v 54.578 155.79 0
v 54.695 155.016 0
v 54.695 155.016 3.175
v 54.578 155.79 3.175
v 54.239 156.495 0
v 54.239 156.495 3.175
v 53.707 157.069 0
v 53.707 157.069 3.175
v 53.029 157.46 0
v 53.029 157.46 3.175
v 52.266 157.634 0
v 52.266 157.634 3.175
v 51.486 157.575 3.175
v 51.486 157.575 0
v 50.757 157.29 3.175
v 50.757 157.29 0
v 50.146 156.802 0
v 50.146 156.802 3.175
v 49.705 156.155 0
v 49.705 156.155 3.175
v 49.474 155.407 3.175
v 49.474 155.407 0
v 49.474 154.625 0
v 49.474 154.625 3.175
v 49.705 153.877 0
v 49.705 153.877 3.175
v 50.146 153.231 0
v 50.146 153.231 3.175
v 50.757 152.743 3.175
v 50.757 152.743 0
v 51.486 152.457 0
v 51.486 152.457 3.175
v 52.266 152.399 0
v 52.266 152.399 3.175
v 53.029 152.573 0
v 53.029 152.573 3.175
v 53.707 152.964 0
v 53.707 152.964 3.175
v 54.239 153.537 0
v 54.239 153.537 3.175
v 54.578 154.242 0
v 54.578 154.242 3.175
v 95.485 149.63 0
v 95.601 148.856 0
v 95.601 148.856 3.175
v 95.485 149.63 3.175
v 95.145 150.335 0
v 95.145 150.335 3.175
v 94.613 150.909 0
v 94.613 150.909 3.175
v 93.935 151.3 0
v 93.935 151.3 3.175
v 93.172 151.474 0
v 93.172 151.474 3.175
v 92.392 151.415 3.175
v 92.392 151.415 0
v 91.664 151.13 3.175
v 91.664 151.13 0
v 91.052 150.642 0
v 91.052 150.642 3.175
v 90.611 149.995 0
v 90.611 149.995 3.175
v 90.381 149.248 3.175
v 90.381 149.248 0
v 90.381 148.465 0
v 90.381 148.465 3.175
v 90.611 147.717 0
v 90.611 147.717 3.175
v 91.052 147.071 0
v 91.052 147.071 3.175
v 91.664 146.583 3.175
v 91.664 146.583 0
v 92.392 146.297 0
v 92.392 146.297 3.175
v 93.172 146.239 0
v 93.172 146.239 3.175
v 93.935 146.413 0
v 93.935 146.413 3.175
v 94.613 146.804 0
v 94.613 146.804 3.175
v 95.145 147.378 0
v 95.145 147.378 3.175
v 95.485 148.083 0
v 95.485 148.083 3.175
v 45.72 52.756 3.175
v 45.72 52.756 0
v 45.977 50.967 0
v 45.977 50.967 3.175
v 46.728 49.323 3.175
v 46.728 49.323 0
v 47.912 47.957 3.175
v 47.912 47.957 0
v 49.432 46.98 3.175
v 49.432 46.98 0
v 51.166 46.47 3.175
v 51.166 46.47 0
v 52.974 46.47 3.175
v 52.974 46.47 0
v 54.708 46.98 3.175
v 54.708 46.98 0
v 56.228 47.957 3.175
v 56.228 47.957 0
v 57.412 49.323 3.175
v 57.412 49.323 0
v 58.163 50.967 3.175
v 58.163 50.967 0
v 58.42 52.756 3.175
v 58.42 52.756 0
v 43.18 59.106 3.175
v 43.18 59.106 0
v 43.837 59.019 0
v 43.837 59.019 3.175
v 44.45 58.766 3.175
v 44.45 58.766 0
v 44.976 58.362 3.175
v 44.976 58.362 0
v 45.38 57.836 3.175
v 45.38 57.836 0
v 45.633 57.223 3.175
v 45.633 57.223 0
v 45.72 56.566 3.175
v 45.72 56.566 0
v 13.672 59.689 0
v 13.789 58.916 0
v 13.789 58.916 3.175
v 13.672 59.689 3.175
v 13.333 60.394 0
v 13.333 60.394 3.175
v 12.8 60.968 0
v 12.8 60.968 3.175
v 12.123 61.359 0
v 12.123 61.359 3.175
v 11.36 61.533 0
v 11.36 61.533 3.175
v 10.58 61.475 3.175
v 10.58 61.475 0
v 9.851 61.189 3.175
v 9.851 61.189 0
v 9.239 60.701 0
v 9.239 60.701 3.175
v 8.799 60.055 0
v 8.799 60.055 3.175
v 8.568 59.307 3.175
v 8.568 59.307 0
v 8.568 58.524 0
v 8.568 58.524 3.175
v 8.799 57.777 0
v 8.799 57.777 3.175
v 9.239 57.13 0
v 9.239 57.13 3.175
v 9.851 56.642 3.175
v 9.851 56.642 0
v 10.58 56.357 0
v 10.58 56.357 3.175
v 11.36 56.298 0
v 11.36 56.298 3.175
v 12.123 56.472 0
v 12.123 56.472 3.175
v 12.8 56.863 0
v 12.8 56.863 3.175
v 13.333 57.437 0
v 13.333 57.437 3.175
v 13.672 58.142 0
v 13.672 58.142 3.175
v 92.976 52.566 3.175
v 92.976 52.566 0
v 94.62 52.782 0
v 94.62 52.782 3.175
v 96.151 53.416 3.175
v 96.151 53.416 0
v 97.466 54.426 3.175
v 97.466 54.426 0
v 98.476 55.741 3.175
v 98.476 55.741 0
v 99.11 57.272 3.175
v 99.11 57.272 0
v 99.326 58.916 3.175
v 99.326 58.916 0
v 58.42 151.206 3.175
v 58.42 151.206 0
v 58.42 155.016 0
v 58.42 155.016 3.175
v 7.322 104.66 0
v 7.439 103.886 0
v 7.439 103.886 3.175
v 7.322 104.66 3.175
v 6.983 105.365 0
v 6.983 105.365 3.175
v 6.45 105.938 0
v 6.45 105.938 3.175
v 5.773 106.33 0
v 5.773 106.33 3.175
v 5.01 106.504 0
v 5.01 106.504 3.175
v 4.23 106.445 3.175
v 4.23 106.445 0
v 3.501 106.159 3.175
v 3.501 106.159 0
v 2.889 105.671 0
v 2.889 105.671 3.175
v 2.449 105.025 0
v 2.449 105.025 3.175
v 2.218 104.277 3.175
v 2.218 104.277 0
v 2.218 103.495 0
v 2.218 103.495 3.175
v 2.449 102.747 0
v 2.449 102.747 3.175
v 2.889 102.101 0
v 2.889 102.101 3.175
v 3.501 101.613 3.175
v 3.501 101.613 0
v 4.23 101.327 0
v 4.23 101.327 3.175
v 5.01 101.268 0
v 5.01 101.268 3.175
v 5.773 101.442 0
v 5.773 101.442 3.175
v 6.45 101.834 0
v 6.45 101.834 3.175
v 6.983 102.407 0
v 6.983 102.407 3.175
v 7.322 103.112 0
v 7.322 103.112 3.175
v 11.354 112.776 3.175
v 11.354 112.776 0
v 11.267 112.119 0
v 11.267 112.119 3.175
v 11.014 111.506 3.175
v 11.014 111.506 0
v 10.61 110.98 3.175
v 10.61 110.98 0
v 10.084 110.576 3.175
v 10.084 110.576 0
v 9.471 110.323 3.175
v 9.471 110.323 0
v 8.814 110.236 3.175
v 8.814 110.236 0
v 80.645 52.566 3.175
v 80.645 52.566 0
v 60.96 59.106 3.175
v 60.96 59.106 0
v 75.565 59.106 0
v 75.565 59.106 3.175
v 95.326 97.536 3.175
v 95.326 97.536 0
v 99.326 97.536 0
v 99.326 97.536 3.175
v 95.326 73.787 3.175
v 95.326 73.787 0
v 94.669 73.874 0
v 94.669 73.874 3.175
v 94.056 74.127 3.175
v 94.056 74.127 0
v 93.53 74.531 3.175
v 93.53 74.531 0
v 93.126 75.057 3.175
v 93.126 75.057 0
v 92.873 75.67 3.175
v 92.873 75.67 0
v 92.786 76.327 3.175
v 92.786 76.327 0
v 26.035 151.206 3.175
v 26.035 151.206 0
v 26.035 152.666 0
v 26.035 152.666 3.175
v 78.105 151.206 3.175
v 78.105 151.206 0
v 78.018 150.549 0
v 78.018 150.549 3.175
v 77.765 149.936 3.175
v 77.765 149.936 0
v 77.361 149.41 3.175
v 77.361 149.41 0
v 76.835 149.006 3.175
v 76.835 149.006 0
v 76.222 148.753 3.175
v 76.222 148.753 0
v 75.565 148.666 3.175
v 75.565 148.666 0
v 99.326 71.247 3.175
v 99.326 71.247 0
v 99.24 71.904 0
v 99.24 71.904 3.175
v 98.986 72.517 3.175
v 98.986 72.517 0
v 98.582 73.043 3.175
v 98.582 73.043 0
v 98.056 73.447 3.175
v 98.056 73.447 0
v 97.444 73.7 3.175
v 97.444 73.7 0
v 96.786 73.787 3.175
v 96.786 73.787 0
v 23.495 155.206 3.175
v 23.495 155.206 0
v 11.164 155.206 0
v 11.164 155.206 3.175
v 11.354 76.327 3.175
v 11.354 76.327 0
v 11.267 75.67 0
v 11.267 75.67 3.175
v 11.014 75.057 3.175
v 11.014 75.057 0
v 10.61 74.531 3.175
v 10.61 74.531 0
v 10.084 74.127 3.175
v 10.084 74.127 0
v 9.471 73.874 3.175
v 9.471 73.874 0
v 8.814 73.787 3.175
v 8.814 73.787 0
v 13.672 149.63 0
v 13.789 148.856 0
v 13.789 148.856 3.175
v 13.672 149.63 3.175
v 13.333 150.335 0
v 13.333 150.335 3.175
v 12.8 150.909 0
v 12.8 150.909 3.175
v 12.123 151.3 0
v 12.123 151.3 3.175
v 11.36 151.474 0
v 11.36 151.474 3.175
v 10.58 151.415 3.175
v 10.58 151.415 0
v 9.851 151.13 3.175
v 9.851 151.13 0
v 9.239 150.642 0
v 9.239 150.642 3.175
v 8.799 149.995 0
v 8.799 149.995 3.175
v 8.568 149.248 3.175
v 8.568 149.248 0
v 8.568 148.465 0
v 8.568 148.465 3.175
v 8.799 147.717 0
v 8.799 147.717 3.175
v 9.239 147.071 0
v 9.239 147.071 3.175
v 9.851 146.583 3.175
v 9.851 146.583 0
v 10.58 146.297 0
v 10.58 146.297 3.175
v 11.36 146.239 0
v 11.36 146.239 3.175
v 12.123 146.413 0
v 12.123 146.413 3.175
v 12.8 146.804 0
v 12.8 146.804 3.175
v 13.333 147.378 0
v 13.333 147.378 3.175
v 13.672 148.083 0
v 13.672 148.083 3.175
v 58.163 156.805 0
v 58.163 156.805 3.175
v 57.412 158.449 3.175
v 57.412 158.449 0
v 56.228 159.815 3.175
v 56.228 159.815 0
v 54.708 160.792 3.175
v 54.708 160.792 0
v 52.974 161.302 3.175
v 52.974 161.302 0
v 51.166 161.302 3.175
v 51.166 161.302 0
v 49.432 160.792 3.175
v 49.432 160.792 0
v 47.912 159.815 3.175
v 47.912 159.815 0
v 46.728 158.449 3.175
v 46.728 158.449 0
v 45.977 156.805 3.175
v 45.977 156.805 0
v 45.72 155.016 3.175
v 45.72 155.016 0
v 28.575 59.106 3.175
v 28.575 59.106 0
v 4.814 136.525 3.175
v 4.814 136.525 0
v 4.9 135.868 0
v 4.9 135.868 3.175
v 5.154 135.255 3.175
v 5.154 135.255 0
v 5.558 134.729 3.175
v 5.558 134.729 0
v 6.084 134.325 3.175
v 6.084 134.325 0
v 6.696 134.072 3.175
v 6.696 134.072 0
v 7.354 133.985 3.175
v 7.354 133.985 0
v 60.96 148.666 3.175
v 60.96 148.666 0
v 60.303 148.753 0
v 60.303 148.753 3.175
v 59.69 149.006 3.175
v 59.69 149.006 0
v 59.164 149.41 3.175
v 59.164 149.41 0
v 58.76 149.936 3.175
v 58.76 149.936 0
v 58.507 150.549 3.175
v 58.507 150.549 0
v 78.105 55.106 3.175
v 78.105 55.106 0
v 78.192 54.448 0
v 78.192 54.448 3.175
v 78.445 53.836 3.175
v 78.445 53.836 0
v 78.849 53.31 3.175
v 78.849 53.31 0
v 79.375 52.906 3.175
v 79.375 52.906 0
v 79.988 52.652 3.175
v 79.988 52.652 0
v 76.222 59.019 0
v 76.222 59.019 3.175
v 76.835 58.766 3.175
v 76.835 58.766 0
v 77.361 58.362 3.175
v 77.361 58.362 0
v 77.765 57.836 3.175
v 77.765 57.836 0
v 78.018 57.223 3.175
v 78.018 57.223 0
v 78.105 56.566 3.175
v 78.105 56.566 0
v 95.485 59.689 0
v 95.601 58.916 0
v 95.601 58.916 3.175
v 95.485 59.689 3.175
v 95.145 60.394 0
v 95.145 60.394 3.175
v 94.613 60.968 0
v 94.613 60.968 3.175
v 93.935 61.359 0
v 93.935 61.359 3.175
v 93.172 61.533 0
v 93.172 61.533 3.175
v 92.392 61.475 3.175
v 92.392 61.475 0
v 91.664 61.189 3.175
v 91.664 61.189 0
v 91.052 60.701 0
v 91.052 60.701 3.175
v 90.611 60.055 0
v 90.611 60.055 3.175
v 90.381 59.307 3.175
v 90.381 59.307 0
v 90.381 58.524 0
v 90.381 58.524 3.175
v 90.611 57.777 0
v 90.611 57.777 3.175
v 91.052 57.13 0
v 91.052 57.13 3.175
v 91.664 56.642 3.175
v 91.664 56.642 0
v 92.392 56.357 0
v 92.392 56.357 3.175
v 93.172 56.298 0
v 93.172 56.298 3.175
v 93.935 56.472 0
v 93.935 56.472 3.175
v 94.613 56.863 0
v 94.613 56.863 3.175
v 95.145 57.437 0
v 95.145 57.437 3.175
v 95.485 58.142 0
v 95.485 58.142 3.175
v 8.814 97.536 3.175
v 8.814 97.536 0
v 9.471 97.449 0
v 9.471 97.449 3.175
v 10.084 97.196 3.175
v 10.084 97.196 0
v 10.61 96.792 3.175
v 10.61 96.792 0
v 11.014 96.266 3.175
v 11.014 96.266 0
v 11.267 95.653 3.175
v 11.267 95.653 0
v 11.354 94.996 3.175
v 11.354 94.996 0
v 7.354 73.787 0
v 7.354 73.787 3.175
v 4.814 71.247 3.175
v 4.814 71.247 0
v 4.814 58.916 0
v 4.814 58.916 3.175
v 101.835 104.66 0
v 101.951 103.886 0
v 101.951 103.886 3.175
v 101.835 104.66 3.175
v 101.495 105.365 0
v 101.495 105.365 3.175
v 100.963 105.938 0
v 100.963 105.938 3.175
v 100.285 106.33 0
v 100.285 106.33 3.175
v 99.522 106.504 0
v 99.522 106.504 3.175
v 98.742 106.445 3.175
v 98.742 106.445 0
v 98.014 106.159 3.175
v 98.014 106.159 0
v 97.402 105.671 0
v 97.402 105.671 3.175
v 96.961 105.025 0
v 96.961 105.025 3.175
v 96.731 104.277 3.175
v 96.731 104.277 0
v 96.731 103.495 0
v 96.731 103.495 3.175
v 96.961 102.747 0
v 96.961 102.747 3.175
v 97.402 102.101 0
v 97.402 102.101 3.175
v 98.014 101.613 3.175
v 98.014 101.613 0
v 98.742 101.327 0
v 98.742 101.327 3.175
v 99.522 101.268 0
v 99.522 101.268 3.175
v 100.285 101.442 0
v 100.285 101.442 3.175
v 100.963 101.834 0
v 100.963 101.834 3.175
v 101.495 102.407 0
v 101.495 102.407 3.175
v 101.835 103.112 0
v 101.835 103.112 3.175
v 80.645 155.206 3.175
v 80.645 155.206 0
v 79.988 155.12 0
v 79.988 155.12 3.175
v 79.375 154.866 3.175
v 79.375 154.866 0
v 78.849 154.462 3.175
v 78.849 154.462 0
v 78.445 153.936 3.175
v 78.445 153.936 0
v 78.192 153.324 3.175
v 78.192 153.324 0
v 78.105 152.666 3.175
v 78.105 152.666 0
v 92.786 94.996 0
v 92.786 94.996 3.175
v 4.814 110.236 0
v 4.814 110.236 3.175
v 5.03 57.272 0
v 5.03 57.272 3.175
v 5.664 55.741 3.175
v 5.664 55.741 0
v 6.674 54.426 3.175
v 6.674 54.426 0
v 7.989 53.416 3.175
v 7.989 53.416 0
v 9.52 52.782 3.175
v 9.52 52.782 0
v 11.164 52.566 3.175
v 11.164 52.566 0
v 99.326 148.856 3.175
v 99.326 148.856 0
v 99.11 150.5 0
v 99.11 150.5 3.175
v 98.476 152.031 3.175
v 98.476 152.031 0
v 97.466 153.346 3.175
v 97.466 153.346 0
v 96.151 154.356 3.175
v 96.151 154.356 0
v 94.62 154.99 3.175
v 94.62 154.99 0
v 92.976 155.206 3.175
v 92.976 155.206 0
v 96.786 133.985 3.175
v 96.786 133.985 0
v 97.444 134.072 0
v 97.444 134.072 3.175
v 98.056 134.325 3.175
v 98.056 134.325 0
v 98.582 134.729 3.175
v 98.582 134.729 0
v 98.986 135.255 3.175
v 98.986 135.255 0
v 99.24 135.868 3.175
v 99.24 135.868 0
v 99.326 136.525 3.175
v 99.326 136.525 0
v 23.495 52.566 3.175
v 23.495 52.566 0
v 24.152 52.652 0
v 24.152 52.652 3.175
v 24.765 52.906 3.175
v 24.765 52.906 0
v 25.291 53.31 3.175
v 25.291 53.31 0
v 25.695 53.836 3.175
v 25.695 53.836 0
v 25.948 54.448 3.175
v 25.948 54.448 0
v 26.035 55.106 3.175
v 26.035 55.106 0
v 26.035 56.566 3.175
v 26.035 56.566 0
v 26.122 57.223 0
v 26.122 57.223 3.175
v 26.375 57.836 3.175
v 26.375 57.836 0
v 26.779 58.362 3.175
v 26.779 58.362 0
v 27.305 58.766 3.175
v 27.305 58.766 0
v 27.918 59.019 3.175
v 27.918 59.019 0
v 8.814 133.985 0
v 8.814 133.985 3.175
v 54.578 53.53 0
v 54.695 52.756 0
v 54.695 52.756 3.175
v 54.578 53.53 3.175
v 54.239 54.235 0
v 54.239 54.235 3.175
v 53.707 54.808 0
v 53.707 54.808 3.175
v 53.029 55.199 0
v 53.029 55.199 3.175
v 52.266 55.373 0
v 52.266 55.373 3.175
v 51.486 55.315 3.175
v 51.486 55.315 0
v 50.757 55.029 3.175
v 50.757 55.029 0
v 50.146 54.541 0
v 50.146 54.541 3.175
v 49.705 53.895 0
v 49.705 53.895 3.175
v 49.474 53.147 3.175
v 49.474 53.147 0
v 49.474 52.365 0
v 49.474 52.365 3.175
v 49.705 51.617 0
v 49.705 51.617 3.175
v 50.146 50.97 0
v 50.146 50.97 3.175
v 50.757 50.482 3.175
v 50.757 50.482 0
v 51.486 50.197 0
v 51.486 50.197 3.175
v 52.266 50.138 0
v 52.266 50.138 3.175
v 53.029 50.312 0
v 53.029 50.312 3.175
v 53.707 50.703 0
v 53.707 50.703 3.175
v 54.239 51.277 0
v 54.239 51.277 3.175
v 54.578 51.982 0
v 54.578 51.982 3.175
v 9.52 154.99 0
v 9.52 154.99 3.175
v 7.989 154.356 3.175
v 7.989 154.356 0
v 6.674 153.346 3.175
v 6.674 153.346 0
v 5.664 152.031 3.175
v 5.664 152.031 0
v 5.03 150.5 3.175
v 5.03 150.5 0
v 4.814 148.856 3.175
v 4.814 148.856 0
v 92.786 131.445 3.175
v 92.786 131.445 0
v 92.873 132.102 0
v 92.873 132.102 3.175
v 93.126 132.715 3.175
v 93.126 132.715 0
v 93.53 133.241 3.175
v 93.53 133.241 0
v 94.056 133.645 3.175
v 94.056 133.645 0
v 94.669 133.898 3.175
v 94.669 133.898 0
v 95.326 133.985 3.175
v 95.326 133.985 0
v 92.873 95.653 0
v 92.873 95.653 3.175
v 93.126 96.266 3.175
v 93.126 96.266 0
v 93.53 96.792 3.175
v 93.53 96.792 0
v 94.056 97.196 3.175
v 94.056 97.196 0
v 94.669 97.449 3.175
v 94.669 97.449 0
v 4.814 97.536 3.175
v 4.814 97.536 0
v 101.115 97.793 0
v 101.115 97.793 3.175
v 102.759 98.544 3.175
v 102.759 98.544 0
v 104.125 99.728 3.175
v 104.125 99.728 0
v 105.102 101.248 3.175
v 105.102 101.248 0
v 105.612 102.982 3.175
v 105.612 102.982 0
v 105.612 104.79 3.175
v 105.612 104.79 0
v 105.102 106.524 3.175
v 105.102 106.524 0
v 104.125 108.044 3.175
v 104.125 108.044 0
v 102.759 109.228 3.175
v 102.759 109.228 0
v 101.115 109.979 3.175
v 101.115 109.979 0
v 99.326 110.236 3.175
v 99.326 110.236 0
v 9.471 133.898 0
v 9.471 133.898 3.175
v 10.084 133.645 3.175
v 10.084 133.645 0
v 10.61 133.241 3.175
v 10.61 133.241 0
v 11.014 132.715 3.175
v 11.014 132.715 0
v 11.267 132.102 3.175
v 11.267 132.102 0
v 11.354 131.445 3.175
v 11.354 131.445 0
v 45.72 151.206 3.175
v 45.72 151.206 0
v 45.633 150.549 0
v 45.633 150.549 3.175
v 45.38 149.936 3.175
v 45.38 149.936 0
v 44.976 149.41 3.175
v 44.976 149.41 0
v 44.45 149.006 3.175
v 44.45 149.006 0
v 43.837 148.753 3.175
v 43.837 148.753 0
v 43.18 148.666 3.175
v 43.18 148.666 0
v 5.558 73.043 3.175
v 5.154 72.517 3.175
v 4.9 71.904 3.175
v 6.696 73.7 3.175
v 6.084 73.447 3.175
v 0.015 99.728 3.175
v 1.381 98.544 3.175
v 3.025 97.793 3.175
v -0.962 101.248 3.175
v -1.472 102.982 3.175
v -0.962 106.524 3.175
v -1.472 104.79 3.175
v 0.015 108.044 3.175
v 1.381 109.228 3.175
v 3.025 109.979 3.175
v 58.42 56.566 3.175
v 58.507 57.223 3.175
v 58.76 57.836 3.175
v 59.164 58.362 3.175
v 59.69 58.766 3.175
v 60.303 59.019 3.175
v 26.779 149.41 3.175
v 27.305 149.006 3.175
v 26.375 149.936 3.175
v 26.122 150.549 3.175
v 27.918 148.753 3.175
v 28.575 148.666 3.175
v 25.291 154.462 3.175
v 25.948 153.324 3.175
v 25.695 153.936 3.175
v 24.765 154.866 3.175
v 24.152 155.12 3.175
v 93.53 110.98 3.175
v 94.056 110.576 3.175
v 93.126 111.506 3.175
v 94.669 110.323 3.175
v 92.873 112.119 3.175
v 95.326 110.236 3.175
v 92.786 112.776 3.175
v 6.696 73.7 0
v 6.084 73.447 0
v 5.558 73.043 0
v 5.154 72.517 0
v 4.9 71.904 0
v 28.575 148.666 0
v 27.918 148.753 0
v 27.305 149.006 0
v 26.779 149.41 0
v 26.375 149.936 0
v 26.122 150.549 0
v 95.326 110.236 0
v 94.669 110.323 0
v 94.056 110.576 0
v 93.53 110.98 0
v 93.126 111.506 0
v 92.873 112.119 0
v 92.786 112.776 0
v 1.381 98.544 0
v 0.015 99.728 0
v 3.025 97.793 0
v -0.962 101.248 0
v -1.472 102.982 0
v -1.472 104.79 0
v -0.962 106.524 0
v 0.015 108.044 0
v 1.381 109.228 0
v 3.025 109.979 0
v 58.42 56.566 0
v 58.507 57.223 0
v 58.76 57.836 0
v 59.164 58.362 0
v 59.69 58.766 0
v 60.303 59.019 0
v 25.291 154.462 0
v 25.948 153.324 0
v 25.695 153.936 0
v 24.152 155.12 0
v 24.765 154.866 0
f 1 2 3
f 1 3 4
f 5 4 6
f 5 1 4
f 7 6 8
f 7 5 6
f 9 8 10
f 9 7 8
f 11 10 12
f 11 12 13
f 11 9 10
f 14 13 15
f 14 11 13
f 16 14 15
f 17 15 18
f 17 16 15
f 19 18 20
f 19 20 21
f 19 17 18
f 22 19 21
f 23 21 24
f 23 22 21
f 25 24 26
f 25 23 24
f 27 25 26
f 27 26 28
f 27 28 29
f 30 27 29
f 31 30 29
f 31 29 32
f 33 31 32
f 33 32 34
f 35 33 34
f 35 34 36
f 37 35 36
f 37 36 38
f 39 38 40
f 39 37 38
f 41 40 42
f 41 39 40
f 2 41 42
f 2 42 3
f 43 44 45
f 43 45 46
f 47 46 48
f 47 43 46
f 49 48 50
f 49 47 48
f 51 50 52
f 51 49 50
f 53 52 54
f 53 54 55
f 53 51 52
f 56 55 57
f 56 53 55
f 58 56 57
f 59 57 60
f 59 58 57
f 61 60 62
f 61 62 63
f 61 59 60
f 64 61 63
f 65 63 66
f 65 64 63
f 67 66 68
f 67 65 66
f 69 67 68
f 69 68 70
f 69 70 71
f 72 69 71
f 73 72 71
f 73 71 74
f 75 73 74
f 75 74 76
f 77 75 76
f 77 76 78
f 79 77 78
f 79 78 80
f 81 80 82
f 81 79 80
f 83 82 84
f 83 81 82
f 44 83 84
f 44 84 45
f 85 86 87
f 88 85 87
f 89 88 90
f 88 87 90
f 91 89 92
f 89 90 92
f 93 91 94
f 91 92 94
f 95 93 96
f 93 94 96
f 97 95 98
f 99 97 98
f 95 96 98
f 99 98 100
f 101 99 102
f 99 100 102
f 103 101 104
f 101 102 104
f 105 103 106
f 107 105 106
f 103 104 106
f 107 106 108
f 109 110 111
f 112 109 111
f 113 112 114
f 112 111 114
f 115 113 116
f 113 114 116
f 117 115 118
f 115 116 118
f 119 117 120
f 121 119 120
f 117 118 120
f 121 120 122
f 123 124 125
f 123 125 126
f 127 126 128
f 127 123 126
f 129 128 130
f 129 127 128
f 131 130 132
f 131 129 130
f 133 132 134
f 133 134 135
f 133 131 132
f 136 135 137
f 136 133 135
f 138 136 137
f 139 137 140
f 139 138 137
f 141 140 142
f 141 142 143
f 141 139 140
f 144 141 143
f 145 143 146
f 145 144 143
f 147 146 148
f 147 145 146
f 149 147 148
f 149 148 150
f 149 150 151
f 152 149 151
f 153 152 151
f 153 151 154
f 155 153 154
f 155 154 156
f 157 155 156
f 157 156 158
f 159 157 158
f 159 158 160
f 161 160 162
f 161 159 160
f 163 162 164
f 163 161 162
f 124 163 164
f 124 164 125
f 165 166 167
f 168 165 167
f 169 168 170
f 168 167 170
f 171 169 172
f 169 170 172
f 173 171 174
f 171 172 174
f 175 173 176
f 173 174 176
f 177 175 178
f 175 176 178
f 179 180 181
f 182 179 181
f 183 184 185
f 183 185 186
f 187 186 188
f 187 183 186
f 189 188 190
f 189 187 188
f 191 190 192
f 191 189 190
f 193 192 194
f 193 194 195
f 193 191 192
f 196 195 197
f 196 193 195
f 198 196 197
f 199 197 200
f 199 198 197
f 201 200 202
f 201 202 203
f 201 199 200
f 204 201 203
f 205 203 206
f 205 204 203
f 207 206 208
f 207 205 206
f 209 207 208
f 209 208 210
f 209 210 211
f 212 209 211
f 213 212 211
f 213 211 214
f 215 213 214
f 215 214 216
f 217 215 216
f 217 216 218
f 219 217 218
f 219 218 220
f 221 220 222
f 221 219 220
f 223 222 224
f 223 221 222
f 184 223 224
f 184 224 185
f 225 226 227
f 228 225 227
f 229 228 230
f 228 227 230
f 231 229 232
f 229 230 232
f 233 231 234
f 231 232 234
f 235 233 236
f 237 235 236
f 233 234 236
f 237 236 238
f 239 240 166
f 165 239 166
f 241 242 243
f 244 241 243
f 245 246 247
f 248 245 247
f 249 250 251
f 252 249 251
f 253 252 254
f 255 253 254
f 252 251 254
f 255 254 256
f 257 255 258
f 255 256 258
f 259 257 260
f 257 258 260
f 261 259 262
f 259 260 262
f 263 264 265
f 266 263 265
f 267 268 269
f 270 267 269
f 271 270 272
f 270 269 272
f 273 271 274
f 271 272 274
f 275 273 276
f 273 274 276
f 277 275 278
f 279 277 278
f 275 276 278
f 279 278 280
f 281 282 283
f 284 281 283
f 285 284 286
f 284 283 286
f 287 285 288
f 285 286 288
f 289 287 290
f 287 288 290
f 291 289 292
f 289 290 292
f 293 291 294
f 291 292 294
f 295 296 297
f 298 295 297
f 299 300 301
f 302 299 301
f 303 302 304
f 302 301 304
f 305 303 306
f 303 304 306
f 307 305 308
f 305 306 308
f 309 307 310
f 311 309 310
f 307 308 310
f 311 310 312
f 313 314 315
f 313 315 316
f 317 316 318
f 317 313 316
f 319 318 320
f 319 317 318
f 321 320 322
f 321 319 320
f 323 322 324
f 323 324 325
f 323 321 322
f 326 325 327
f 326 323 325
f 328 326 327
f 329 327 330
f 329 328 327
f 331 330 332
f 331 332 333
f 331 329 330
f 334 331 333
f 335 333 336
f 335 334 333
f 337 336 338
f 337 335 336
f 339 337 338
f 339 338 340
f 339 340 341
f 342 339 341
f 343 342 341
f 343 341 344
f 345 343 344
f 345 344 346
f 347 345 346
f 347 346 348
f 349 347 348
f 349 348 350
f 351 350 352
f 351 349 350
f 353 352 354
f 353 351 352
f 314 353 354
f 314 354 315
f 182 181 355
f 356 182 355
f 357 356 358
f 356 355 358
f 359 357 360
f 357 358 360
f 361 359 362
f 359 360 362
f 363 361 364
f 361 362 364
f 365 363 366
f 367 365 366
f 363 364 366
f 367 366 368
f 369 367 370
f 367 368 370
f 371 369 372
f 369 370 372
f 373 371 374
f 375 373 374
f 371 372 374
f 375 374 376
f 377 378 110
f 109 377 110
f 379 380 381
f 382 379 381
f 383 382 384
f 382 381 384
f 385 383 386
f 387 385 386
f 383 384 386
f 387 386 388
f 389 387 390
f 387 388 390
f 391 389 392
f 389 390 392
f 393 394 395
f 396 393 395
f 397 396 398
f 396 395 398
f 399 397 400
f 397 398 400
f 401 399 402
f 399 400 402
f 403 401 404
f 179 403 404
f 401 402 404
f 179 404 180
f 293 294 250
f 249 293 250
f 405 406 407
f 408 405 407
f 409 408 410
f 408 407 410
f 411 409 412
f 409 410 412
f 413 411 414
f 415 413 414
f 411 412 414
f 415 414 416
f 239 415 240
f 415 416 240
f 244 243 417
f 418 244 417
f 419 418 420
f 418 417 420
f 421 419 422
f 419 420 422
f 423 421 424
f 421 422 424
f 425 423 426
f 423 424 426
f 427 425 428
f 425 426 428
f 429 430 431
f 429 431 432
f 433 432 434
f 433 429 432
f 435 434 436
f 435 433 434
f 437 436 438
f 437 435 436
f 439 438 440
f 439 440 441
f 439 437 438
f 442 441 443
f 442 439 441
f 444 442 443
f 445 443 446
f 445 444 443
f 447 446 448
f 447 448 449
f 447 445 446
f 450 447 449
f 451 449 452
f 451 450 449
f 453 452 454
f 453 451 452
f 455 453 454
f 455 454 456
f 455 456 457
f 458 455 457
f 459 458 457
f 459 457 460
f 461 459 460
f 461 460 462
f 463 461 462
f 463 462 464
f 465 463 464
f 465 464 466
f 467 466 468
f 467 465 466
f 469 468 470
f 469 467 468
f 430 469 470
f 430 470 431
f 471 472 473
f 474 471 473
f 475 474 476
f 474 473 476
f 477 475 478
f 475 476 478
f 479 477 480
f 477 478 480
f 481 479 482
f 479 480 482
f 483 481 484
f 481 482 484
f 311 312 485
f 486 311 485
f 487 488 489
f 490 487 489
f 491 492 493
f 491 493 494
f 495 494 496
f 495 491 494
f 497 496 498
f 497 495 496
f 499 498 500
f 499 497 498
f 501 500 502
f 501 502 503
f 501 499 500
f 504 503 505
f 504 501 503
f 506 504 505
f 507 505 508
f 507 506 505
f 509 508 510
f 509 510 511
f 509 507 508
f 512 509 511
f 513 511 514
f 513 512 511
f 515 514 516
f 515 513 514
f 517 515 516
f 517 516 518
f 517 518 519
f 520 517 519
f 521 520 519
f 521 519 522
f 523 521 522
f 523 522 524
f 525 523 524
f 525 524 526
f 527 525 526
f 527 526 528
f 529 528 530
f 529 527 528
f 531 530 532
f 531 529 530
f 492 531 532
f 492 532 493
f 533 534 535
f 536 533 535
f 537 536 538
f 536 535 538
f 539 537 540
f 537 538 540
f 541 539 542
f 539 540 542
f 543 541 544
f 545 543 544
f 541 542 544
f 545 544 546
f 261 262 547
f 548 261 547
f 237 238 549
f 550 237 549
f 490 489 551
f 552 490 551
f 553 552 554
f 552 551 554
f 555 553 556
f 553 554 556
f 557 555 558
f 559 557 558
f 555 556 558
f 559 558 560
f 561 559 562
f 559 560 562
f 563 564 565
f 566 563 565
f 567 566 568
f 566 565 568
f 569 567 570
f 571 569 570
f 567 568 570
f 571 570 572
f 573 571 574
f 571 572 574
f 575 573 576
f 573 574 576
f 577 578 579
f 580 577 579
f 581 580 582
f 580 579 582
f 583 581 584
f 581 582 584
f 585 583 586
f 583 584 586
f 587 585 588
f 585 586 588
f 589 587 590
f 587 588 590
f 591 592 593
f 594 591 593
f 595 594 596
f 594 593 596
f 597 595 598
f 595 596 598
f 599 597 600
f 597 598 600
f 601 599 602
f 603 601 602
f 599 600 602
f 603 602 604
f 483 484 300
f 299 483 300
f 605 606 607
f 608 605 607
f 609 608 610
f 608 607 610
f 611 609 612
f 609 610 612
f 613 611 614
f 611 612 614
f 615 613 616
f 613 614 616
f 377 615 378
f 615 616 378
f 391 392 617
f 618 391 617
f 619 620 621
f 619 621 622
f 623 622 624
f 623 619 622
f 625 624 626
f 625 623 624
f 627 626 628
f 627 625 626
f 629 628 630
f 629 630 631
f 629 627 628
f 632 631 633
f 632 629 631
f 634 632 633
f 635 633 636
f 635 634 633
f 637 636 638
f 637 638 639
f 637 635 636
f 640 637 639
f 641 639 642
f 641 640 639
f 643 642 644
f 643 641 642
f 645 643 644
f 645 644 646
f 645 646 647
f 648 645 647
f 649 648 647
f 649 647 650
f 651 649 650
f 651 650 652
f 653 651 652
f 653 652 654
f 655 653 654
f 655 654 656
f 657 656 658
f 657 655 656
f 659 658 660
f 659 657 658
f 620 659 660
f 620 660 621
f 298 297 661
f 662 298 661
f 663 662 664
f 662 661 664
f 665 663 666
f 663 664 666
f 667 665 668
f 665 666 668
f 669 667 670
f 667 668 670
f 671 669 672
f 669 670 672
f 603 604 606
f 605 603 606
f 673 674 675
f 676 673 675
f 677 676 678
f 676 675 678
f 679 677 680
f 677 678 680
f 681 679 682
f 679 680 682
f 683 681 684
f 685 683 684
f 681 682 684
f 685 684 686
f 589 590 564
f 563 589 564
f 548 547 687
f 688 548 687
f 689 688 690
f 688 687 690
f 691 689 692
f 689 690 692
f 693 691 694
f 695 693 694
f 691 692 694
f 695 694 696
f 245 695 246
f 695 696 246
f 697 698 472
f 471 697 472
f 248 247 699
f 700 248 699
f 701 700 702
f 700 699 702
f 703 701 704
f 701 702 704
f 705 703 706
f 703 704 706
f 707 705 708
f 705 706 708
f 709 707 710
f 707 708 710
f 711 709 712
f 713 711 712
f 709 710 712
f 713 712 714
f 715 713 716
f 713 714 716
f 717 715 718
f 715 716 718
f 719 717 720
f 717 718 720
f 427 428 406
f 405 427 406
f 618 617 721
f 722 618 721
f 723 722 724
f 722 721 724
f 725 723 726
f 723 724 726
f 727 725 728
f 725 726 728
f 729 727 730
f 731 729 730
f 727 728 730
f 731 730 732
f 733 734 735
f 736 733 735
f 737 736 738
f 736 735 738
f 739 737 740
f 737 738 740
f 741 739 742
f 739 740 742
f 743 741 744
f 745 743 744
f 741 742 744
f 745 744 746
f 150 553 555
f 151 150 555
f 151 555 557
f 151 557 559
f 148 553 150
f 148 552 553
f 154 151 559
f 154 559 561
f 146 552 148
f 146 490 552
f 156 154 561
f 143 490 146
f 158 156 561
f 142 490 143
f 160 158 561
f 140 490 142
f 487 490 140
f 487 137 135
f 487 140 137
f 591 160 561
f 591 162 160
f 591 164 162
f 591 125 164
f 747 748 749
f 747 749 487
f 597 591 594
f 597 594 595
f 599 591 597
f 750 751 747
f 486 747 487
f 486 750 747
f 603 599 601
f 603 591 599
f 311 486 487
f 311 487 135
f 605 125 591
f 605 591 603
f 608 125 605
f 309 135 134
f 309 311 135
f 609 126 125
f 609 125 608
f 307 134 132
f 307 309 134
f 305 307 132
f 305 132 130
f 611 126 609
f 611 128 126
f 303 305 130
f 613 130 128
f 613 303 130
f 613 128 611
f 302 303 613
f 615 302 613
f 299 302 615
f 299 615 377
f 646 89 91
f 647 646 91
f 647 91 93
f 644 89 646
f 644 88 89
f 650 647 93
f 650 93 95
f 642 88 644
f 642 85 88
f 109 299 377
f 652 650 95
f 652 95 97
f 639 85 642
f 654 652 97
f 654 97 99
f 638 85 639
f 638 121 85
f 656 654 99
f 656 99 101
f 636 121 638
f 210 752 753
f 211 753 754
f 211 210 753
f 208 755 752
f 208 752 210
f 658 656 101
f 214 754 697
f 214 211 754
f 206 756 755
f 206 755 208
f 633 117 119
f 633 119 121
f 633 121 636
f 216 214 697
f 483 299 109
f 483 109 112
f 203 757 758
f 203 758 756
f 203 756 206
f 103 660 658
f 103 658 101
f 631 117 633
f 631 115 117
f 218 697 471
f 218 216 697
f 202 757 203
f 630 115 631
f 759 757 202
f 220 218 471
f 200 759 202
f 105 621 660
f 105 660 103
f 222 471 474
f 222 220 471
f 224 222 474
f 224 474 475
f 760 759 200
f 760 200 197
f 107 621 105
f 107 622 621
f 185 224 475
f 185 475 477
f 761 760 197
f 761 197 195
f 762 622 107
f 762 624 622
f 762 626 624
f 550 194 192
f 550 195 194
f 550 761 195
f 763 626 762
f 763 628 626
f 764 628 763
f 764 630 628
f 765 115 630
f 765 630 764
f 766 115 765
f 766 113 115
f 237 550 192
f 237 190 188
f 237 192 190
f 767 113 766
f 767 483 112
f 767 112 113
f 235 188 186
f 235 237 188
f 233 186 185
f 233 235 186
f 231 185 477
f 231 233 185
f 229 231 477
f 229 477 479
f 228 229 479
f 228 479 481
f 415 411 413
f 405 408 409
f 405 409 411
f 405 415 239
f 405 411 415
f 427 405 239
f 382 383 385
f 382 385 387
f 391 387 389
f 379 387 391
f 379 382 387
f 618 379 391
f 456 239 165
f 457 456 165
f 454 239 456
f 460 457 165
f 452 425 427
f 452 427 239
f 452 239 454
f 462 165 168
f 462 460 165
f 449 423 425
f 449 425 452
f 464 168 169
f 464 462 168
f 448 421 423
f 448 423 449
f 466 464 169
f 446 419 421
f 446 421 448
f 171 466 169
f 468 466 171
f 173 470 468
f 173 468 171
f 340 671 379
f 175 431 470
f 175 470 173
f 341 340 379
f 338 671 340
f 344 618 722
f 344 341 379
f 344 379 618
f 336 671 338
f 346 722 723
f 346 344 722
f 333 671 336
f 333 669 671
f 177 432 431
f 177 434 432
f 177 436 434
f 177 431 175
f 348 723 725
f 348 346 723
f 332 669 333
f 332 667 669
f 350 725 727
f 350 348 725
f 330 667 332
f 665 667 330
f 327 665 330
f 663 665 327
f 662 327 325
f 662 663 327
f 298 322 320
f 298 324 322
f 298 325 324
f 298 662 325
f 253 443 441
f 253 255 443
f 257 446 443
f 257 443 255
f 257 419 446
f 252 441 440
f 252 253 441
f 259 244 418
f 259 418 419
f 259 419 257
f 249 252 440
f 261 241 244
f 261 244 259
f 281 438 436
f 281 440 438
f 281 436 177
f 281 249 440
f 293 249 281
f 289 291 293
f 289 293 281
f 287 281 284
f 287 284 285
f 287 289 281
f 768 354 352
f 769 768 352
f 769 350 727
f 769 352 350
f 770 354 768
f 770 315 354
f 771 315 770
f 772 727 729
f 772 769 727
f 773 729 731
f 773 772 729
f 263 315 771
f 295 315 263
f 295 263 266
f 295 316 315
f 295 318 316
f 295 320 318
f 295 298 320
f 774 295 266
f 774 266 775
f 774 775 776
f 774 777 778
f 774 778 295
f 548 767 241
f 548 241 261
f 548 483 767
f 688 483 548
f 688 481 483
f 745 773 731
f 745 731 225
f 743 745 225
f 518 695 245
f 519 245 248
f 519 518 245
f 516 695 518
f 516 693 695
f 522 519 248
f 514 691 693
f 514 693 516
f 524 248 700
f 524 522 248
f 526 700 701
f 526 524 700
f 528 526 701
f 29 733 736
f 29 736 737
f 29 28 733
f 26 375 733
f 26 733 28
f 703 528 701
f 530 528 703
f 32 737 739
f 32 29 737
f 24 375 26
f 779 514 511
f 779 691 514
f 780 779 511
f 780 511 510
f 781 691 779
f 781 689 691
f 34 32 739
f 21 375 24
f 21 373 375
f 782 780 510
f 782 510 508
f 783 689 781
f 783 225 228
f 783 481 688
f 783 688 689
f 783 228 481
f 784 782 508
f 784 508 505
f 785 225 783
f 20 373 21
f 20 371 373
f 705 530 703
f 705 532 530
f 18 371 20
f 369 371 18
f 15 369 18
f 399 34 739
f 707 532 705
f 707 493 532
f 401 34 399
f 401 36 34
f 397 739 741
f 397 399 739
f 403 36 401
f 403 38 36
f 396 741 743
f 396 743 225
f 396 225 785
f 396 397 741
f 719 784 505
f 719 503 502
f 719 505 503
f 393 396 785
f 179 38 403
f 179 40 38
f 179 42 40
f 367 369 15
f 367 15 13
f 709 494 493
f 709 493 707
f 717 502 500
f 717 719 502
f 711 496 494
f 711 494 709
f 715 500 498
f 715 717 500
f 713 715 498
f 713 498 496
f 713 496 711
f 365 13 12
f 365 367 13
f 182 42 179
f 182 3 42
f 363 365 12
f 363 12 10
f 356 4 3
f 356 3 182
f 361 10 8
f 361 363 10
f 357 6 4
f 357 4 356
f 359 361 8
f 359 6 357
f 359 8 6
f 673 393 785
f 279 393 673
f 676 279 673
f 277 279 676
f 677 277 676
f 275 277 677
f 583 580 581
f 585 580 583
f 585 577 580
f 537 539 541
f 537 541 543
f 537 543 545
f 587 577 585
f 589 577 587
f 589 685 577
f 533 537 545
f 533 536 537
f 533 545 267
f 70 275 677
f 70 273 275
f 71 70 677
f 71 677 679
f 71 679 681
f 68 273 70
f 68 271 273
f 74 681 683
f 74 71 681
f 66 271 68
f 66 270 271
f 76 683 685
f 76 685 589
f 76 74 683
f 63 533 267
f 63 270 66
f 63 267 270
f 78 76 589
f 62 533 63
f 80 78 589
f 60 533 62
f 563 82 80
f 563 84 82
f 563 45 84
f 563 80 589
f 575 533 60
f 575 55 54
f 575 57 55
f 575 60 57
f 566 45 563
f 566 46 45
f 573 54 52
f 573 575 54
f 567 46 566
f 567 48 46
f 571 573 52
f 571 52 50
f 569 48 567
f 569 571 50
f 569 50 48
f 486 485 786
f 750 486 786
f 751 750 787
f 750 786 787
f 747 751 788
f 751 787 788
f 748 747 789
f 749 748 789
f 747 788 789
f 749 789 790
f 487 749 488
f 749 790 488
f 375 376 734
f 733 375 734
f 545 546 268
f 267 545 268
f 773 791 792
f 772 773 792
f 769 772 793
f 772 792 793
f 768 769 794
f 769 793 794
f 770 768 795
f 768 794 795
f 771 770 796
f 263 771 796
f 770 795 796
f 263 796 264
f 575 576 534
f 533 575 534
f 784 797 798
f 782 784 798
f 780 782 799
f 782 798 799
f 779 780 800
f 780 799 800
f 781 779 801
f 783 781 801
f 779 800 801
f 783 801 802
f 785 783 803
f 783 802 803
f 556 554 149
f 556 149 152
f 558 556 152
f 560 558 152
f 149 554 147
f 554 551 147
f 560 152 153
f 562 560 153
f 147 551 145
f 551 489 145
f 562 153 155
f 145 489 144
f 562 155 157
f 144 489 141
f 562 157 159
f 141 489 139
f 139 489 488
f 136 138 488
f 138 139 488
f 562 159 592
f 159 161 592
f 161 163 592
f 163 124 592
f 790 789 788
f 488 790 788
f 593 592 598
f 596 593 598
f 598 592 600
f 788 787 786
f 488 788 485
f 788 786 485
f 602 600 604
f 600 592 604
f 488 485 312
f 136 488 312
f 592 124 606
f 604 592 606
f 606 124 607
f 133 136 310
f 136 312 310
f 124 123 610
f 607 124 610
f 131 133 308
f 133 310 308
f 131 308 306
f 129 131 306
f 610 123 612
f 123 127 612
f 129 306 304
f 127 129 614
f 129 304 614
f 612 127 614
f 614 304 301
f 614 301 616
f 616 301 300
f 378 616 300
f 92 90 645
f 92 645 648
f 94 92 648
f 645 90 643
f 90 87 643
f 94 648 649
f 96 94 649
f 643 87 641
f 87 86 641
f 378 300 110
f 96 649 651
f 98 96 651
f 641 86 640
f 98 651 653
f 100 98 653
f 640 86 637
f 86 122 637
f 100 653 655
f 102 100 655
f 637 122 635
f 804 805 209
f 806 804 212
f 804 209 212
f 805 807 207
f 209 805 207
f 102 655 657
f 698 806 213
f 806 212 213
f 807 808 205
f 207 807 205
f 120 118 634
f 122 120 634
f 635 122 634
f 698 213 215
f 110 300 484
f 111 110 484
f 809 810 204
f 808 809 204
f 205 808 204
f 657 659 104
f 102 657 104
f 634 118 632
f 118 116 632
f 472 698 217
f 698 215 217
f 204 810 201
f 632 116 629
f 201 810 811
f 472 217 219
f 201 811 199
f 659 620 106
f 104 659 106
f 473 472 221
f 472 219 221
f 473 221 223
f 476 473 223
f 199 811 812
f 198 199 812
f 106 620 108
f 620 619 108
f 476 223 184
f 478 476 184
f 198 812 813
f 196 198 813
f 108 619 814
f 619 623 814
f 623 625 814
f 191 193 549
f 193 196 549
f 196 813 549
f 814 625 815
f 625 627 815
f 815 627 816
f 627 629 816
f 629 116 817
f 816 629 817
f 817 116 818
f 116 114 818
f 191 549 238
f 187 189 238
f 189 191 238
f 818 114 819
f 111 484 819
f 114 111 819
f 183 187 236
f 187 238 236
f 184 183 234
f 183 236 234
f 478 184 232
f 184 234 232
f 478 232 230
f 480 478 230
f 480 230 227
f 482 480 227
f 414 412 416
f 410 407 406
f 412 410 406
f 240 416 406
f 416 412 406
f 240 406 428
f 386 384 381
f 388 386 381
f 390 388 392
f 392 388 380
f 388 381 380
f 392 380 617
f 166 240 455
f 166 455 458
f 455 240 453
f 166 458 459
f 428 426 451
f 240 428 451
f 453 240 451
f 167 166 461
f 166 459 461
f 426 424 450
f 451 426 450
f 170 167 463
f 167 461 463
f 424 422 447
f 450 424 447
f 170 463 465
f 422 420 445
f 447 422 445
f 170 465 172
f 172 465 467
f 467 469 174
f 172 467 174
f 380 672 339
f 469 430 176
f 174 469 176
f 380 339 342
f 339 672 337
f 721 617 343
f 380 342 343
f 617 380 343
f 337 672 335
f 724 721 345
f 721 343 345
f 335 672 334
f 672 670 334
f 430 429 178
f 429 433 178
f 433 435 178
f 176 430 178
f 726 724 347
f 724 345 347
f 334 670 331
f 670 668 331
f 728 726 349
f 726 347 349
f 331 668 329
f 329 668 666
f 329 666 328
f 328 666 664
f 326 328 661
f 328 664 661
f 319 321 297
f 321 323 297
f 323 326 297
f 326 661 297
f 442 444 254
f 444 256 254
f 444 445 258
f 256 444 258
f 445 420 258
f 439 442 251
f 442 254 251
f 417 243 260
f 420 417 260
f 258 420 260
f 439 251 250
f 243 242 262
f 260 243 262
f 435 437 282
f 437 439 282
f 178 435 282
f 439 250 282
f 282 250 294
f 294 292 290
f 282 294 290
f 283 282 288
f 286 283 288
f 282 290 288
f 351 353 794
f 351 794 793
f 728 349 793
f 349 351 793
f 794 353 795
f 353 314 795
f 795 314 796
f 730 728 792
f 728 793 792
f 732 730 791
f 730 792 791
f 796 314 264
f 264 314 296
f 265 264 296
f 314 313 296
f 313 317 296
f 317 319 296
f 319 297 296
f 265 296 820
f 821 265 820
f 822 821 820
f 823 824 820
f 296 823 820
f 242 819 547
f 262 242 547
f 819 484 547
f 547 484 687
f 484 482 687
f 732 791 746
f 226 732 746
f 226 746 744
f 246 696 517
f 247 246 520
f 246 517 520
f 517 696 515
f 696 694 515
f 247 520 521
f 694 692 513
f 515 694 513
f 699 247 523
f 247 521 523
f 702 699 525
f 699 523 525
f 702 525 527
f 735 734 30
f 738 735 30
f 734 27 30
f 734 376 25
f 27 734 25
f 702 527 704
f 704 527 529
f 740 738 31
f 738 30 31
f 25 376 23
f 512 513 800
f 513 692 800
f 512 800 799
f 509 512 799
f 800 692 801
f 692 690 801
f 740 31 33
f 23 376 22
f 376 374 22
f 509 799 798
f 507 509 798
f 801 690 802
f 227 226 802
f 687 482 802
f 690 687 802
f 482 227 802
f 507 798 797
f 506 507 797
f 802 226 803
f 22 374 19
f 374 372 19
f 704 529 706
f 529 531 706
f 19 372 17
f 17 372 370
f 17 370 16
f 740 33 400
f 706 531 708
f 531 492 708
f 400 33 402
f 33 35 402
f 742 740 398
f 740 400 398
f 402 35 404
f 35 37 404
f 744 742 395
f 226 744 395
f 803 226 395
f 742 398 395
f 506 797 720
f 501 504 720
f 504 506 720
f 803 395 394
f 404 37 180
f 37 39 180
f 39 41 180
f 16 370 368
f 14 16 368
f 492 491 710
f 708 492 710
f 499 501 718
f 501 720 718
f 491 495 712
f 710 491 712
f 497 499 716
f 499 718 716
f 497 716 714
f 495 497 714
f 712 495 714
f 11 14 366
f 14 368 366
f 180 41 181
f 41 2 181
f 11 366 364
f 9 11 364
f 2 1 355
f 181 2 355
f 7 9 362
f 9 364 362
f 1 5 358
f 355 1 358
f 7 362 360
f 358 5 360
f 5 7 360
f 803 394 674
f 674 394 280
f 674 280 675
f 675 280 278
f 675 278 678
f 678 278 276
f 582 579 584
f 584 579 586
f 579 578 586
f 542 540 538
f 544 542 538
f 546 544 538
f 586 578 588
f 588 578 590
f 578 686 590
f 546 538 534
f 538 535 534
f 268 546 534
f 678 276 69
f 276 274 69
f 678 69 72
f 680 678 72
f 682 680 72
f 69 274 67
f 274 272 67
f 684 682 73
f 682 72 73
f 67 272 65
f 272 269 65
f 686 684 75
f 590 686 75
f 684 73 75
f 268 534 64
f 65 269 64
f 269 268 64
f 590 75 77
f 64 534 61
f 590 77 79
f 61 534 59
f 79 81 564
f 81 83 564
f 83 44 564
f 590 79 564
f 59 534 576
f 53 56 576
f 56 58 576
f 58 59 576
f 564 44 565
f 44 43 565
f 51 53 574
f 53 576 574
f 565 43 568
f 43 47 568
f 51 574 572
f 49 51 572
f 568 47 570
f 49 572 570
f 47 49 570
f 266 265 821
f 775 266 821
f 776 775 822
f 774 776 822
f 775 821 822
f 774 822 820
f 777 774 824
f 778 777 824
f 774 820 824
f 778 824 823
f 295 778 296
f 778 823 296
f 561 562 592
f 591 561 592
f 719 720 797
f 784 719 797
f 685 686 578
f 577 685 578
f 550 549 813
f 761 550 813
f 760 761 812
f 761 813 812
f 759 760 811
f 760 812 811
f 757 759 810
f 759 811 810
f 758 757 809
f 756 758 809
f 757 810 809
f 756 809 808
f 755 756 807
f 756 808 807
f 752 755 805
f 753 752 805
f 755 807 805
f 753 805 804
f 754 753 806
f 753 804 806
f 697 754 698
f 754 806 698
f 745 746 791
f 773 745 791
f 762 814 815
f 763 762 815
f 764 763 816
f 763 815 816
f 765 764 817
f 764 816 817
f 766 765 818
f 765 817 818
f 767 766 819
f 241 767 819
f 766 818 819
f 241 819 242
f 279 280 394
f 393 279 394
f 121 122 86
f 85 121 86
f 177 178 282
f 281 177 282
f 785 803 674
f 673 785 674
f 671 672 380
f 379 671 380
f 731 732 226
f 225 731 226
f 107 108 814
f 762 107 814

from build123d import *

# Parameters (mm, degrees)
SKETCH1_R           = 2.625
BOSS_EXTRUDE1_DEPTH = 3.175


with BuildPart() as part:
    # Sketch1 → Boss-Extrude1 (new body)
    with BuildSketch(Plane.XY):
        with BuildLine():
            Line((4.813695848, 148.856298887), (4.813695848, 136.524994751))
            ThreePointArc((4.813695848, 136.524994751), (5.557644624, 134.728943527), (7.353695848, 133.984994751))
            Line((7.353695848, 133.984994751), (8.813799985, 133.984994751))
            ThreePointArc((8.813799985, 133.984994751), (10.609851209, 133.241045975), (11.353799985, 131.444994751))
            Line((11.353799985, 131.444994751), (11.353799985, 112.775997772))
            ThreePointArc((11.353799985, 112.775997772), (10.609851209, 110.979946548), (8.813799985, 110.235997772))
            Line((8.813799985, 110.235997772), (4.813695848, 110.235997772))
            ThreePointArc((4.813695848, 110.235997772), (-1.536304152, 103.885997772), (4.813695848, 97.535997772))
            Line((4.813695848, 97.535997772), (8.813799985, 97.535997772))
            ThreePointArc((8.813799985, 97.535997772), (10.609851209, 96.792048996), (11.353799985, 94.995997772))
            Line((11.353799985, 94.995997772), (11.353799985, 76.327000793))
            ThreePointArc((11.353799985, 76.327000793), (10.609851209, 74.530949569), (8.813799985, 73.787000793))
            Line((8.813799985, 73.787000793), (7.353695848, 73.787000793))
            ThreePointArc((7.353695848, 73.787000793), (5.557644624, 73.043052018), (4.813695848, 71.247000793))
            Line((4.813695848, 71.247000793), (4.813695848, 58.915696657))
            ThreePointArc((4.813695848, 58.915696657), (6.673567788, 54.425568596), (11.163695848, 52.565696657))
            Line((11.163695848, 52.565696657), (23.494999985, 52.565696657))
            ThreePointArc((23.494999985, 52.565696657), (25.291051209, 53.309645433), (26.034999985, 55.105696657))
            Line((26.034999985, 55.105696657), (26.034999985, 56.565800793))
            ThreePointArc((26.034999985, 56.565800793), (26.778948761, 58.361852018), (28.574999985, 59.105800793))
            Line((28.574999985, 59.105800793), (43.179998741, 59.105800793))
            ThreePointArc((43.179998741, 59.105800793), (44.976049965, 58.361852018), (45.719998741, 56.565800793))
            Line((45.719998741, 56.565800793), (45.719998741, 52.755800793))
            ThreePointArc((45.719998741, 52.755800793), (52.069998741, 46.405800793), (58.419998741, 52.755800793))
            Line((58.419998741, 52.755800793), (58.419998741, 56.565800793))
            ThreePointArc((58.419998741, 56.565800793), (59.163947517, 58.361852018), (60.959998741, 59.105800793))
            Line((60.959998741, 59.105800793), (75.564997498, 59.105800793))
            ThreePointArc((75.564997498, 59.105800793), (77.361048722, 58.361852018), (78.104997498, 56.565800793))
            Line((78.104997498, 56.565800793), (78.104997498, 55.105696657))
            ThreePointArc((78.104997498, 55.105696657), (78.848946273, 53.309645433), (80.644997498, 52.565696657))
            Line((80.644997498, 52.565696657), (92.976301634, 52.565696657))
            ThreePointArc((92.976301634, 52.565696657), (97.466429695, 54.425568596), (99.326301634, 58.915696657))
            Line((99.326301634, 58.915696657), (99.326301634, 71.247000793))
            ThreePointArc((99.326301634, 71.247000793), (98.582352858, 73.043052018), (96.786301634, 73.787000793))
            Line((96.786301634, 73.787000793), (95.326197498, 73.787000793))
            ThreePointArc((95.326197498, 73.787000793), (93.530146273, 74.530949569), (92.786197498, 76.327000793))
            Line((92.786197498, 76.327000793), (92.786197498, 94.995997772))
            ThreePointArc((92.786197498, 94.995997772), (93.530146273, 96.792048996), (95.326197498, 97.535997772))
            Line((95.326197498, 97.535997772), (99.326301634, 97.535997772))
            ThreePointArc((99.326301634, 97.535997772), (105.676301634, 103.885997772), (99.326301634, 110.235997772))
            Line((99.326301634, 110.235997772), (95.326197498, 110.235997772))
            ThreePointArc((95.326197498, 110.235997772), (93.530146273, 110.979946548), (92.786197498, 112.775997772))
            Line((92.786197498, 112.775997772), (92.786197498, 131.444994751))
            ThreePointArc((92.786197498, 131.444994751), (93.530146273, 133.241045975), (95.326197498, 133.984994751))
            Line((95.326197498, 133.984994751), (96.786301634, 133.984994751))
            ThreePointArc((96.786301634, 133.984994751), (98.582352858, 134.728943527), (99.326301634, 136.524994751))
            Line((99.326301634, 136.524994751), (99.326301634, 148.856298887))
            ThreePointArc((99.326301634, 148.856298887), (97.466429695, 153.346426948), (92.976301634, 155.206298887))
            Line((92.976301634, 155.206298887), (80.644997498, 155.206298887))
            ThreePointArc((80.644997498, 155.206298887), (78.848946273, 154.462350112), (78.104997498, 152.666298887))
            Line((78.104997498, 152.666298887), (78.104997498, 151.206194751))
            ThreePointArc((78.104997498, 151.206194751), (77.361048722, 149.410143527), (75.564997498, 148.666194751))
            Line((75.564997498, 148.666194751), (60.959998741, 148.666194751))
            ThreePointArc((60.959998741, 148.666194751), (59.163947517, 149.410143527), (58.419998741, 151.206194751))
            Line((58.419998741, 151.206194751), (58.419998741, 155.016194751))
            ThreePointArc((58.419998741, 155.016194751), (52.069998741, 161.366194751), (45.719998741, 155.016194751))
            Line((45.719998741, 155.016194751), (45.719998741, 151.206194751))
            ThreePointArc((45.719998741, 151.206194751), (44.976049965, 149.410143527), (43.179998741, 148.666194751))
            Line((43.179998741, 148.666194751), (28.574999985, 148.666194751))
            ThreePointArc((28.574999985, 148.666194751), (26.778948761, 149.410143527), (26.034999985, 151.206194751))
            Line((26.034999985, 151.206194751), (26.034999985, 152.666298887))
            ThreePointArc((26.034999985, 152.666298887), (25.291051209, 154.462350112), (23.494999985, 155.206298887))
            Line((23.494999985, 155.206298887), (11.163695848, 155.206298887))
            ThreePointArc((11.163695848, 155.206298887), (6.673567788, 153.346426948), (4.813695848, 148.856298887))
        make_face()
        with Locations((11.163695848, 148.856298887)):
            Circle(SKETCH1_R, mode=Mode.SUBTRACT)
        with Locations((92.976301634, 148.856298887)):
            Circle(SKETCH1_R, mode=Mode.SUBTRACT)
        with Locations((52.069998741, 155.016194751)):
            Circle(SKETCH1_R, mode=Mode.SUBTRACT)
        with Locations((99.326301634, 103.885997772)):
            Circle(SKETCH1_R, mode=Mode.SUBTRACT)
        with Locations((92.976301634, 58.915696657)):
            Circle(SKETCH1_R, mode=Mode.SUBTRACT)
        with Locations((52.069998741, 52.755800793)):
            Circle(SKETCH1_R, mode=Mode.SUBTRACT)
        with Locations((11.163695848, 58.915696657)):
            Circle(SKETCH1_R, mode=Mode.SUBTRACT)
        with Locations((4.813695848, 103.885997772)):
            Circle(SKETCH1_R, mode=Mode.SUBTRACT)
    extrude(amount=BOSS_EXTRUDE1_DEPTH)


solid = part.part
